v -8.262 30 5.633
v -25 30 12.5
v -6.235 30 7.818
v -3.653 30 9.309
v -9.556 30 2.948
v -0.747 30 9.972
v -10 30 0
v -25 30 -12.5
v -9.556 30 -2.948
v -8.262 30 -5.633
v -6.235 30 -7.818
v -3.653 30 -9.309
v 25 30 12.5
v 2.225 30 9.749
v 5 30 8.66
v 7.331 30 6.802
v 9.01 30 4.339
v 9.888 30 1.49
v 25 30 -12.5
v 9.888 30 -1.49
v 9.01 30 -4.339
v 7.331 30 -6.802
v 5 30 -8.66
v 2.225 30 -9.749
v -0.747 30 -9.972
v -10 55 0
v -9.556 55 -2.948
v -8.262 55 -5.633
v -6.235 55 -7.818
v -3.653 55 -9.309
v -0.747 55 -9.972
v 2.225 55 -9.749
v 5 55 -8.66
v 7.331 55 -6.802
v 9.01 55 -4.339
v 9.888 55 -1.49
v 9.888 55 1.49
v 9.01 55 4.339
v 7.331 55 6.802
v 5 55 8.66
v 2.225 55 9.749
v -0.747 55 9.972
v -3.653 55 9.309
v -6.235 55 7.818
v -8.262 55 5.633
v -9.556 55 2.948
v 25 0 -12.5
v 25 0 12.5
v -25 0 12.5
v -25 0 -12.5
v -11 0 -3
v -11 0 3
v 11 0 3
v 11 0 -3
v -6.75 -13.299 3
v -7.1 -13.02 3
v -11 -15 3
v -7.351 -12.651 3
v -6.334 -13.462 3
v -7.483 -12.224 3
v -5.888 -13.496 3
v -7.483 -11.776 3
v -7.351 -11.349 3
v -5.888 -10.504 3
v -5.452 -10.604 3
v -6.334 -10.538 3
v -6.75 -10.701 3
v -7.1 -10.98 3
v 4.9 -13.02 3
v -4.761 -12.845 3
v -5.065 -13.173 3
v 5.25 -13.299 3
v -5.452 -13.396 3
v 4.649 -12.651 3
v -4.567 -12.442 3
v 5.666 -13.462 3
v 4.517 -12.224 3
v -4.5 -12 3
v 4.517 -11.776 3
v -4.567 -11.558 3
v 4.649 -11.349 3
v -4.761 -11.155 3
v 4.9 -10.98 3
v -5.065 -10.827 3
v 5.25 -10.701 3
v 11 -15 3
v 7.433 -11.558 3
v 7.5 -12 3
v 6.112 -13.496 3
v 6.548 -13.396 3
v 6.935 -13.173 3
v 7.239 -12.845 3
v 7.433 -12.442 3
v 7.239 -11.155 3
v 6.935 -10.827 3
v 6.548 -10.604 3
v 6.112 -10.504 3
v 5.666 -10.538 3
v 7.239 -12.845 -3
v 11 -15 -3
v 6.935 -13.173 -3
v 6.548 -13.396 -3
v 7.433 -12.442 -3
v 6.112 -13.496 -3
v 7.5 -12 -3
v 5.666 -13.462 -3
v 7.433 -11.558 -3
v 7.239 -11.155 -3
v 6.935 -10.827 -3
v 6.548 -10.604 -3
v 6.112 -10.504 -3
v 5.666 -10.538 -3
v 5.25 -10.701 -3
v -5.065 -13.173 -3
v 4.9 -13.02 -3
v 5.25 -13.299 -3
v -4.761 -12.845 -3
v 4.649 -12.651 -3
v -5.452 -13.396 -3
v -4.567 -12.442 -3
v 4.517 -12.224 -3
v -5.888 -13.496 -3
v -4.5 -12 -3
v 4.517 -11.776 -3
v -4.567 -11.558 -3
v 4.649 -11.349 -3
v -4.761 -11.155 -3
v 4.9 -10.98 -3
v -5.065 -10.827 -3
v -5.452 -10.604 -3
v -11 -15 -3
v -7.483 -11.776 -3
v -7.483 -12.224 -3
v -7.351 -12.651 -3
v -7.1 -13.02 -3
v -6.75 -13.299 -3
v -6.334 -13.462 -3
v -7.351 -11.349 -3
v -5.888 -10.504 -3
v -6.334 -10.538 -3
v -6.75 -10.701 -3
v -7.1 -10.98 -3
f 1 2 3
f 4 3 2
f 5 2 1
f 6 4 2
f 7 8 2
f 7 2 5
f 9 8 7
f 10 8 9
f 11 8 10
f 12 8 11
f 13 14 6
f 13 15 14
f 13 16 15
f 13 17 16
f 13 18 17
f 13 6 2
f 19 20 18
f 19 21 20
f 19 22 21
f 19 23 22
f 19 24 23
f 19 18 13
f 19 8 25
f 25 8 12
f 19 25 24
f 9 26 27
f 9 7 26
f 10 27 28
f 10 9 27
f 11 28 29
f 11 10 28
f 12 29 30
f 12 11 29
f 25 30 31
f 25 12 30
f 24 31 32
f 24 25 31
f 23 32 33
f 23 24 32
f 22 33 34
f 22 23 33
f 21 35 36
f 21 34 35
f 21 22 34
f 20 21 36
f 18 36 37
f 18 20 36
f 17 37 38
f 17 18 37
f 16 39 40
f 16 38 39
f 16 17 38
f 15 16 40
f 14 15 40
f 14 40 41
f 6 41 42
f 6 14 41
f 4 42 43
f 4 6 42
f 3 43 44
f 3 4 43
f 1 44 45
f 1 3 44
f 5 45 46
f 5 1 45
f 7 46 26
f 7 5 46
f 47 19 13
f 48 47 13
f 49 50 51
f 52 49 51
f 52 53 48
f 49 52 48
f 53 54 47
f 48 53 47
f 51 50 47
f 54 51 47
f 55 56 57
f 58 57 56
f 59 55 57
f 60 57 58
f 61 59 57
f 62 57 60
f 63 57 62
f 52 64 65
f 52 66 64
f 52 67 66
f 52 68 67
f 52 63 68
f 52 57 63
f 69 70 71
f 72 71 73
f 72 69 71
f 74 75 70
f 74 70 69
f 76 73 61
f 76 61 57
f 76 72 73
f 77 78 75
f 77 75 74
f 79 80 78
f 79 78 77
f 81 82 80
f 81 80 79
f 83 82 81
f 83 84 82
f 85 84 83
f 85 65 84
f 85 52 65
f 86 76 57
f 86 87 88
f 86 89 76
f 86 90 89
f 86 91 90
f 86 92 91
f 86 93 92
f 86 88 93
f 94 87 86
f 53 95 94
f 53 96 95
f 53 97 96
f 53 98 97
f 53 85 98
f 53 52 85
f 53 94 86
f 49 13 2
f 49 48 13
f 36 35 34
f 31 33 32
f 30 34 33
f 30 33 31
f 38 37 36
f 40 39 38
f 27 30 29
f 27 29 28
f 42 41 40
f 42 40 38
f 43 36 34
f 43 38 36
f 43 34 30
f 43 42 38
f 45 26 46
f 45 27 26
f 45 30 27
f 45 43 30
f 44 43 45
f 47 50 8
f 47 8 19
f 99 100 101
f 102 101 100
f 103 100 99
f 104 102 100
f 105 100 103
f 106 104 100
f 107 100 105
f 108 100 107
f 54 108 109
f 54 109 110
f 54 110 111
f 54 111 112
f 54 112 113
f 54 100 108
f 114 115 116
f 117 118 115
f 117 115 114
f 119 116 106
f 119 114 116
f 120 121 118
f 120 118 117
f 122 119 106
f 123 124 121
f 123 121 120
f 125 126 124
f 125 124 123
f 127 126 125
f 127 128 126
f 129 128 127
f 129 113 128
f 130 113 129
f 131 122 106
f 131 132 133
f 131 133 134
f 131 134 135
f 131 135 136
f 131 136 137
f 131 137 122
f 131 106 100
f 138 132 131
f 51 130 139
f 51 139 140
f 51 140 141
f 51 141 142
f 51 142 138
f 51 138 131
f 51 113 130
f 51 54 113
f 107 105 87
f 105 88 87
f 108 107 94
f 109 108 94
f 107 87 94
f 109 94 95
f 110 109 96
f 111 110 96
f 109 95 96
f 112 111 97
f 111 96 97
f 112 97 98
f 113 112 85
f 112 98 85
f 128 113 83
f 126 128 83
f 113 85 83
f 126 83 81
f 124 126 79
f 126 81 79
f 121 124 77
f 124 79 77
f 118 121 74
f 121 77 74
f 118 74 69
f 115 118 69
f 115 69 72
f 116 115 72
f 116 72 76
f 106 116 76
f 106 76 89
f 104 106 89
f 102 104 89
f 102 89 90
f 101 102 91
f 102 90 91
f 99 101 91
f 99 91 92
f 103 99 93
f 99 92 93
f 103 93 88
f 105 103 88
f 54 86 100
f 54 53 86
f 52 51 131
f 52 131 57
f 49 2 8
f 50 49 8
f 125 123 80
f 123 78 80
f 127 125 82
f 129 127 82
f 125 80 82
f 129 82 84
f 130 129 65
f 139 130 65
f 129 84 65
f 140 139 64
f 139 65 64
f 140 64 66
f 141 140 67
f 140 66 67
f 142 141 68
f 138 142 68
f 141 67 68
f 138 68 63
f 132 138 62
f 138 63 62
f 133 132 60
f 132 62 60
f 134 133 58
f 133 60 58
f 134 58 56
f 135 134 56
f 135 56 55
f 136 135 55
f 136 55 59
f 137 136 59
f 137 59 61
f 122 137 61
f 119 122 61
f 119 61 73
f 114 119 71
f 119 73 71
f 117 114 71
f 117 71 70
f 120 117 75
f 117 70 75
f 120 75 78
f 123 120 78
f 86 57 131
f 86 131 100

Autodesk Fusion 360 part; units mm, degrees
sketch "Sketch1" plane through (0, 0, 0) normal (0, 1, 0) x (1, 0, 0)
  line L0 (25, -12.5) -> (-25, -12.5)
  line L1 (-25, -12.5) -> (-25, 12.5)
  line L2 (-25, 12.5) -> (25, 12.5)
  line L3 (25, 12.5) -> (25, -12.5)
  line L4 (25, -12.5) -> (-25, 12.5) construction
  line L5 (-25, -12.5) -> (25, 12.5) construction
  dimension "d1" = 50
  dimension "d2" = 25
extrude "Extrude1" add sketch "Sketch1" along normal blind 30 makes body 1
sketch "Sketch2" plane through (0, 30, 0) normal (0, 1, 0) x (-1, 0, 0)
  line L0 (-25, -12.5) -> (25, -12.5)
  line L1 (25, -12.5) -> (25, 12.5)
  line L2 (25, 12.5) -> (-25, 12.5)
  line L3 (-25, 12.5) -> (-25, -12.5)
  circle A0 centre (0, 0) radius 10
  dimension "d5" = 20
extrude "Extrude2" add sketch "Sketch2" along normal blind 25 contours A0 bodies 1
sketch "Sketch3" plane through (0, 0, 0) normal (0, -1, 0) x (1, 0, 0)
  line L0 (-25, -12.5) -> (25, -12.5)
  line L1 (25, -12.5) -> (25, 12.5)
  line L2 (25, 12.5) -> (-25, 12.5)
  line L3 (-25, 12.5) -> (-25, -12.5)
  line L4 (11, -3) -> (-11, -3)
  line L5 (-11, -3) -> (-11, 3)
  line L6 (-11, 3) -> (11, 3)
  line L7 (11, 3) -> (11, -3)
  line L8 (11, -3) -> (-11, 3) construction
  line L9 (-11, -3) -> (11, 3) construction
  dimension "d8" = 22
  dimension "d9" = 6
extrude "Extrude4" add sketch "Sketch3" along normal blind 10 contours L4 L5 L6 L7 bodies 1
sketch "Sketch4" plane through (0, 0, 3) normal (0, 0, 1) x (1, 0, 0)
  line L0 (11, 0) -> (-11, 0)
  line L1 (-11, 0) -> (-11, -10)
  line L2 (-11, -10) -> (11, -10)
  line L3 (11, -10) -> (11, 0)
  circle A0 centre (-6, -7) radius 1.5
  circle A1 centre (6, -7) radius 1.5
  dimension "d16" = 3
  dimension "d19" = 3
extrude "Extrude5" cut sketch "Sketch4" against normal blind 15 contours A0 | A1 bodies 1
extrude "Extrude3" add sketch "Sketch3" along normal blind 15 contours L4 L5 L6 L7 bodies 1
sketch "Sketch5" plane through (0, 0, 3) normal (0, 0, 1) x (1, 0, 0)
  line L0 (11, 0) -> (-11, 0)
  line L1 (-11, 0) -> (-11, -15)
  line L2 (-11, -15) -> (11, -15)
  line L3 (11, -15) -> (11, 0)
  circle A0 centre (-6, -12) radius 1.5
  circle A1 centre (6, -12) radius 1.5
  dimension "d26" = 3
  dimension "d27" = 3
extrude "Extrude6" cut sketch "Sketch5" against normal blind 21 contours A0 | A1 bodies 1
copy_body "Body->Comp2" bodies 1 removing the originals makes body 2 in component "Component"
component "Component" placed x (1, 0, 0) y (0, 1, 0) z (0, 0, 1) at (0, 0, 0)
